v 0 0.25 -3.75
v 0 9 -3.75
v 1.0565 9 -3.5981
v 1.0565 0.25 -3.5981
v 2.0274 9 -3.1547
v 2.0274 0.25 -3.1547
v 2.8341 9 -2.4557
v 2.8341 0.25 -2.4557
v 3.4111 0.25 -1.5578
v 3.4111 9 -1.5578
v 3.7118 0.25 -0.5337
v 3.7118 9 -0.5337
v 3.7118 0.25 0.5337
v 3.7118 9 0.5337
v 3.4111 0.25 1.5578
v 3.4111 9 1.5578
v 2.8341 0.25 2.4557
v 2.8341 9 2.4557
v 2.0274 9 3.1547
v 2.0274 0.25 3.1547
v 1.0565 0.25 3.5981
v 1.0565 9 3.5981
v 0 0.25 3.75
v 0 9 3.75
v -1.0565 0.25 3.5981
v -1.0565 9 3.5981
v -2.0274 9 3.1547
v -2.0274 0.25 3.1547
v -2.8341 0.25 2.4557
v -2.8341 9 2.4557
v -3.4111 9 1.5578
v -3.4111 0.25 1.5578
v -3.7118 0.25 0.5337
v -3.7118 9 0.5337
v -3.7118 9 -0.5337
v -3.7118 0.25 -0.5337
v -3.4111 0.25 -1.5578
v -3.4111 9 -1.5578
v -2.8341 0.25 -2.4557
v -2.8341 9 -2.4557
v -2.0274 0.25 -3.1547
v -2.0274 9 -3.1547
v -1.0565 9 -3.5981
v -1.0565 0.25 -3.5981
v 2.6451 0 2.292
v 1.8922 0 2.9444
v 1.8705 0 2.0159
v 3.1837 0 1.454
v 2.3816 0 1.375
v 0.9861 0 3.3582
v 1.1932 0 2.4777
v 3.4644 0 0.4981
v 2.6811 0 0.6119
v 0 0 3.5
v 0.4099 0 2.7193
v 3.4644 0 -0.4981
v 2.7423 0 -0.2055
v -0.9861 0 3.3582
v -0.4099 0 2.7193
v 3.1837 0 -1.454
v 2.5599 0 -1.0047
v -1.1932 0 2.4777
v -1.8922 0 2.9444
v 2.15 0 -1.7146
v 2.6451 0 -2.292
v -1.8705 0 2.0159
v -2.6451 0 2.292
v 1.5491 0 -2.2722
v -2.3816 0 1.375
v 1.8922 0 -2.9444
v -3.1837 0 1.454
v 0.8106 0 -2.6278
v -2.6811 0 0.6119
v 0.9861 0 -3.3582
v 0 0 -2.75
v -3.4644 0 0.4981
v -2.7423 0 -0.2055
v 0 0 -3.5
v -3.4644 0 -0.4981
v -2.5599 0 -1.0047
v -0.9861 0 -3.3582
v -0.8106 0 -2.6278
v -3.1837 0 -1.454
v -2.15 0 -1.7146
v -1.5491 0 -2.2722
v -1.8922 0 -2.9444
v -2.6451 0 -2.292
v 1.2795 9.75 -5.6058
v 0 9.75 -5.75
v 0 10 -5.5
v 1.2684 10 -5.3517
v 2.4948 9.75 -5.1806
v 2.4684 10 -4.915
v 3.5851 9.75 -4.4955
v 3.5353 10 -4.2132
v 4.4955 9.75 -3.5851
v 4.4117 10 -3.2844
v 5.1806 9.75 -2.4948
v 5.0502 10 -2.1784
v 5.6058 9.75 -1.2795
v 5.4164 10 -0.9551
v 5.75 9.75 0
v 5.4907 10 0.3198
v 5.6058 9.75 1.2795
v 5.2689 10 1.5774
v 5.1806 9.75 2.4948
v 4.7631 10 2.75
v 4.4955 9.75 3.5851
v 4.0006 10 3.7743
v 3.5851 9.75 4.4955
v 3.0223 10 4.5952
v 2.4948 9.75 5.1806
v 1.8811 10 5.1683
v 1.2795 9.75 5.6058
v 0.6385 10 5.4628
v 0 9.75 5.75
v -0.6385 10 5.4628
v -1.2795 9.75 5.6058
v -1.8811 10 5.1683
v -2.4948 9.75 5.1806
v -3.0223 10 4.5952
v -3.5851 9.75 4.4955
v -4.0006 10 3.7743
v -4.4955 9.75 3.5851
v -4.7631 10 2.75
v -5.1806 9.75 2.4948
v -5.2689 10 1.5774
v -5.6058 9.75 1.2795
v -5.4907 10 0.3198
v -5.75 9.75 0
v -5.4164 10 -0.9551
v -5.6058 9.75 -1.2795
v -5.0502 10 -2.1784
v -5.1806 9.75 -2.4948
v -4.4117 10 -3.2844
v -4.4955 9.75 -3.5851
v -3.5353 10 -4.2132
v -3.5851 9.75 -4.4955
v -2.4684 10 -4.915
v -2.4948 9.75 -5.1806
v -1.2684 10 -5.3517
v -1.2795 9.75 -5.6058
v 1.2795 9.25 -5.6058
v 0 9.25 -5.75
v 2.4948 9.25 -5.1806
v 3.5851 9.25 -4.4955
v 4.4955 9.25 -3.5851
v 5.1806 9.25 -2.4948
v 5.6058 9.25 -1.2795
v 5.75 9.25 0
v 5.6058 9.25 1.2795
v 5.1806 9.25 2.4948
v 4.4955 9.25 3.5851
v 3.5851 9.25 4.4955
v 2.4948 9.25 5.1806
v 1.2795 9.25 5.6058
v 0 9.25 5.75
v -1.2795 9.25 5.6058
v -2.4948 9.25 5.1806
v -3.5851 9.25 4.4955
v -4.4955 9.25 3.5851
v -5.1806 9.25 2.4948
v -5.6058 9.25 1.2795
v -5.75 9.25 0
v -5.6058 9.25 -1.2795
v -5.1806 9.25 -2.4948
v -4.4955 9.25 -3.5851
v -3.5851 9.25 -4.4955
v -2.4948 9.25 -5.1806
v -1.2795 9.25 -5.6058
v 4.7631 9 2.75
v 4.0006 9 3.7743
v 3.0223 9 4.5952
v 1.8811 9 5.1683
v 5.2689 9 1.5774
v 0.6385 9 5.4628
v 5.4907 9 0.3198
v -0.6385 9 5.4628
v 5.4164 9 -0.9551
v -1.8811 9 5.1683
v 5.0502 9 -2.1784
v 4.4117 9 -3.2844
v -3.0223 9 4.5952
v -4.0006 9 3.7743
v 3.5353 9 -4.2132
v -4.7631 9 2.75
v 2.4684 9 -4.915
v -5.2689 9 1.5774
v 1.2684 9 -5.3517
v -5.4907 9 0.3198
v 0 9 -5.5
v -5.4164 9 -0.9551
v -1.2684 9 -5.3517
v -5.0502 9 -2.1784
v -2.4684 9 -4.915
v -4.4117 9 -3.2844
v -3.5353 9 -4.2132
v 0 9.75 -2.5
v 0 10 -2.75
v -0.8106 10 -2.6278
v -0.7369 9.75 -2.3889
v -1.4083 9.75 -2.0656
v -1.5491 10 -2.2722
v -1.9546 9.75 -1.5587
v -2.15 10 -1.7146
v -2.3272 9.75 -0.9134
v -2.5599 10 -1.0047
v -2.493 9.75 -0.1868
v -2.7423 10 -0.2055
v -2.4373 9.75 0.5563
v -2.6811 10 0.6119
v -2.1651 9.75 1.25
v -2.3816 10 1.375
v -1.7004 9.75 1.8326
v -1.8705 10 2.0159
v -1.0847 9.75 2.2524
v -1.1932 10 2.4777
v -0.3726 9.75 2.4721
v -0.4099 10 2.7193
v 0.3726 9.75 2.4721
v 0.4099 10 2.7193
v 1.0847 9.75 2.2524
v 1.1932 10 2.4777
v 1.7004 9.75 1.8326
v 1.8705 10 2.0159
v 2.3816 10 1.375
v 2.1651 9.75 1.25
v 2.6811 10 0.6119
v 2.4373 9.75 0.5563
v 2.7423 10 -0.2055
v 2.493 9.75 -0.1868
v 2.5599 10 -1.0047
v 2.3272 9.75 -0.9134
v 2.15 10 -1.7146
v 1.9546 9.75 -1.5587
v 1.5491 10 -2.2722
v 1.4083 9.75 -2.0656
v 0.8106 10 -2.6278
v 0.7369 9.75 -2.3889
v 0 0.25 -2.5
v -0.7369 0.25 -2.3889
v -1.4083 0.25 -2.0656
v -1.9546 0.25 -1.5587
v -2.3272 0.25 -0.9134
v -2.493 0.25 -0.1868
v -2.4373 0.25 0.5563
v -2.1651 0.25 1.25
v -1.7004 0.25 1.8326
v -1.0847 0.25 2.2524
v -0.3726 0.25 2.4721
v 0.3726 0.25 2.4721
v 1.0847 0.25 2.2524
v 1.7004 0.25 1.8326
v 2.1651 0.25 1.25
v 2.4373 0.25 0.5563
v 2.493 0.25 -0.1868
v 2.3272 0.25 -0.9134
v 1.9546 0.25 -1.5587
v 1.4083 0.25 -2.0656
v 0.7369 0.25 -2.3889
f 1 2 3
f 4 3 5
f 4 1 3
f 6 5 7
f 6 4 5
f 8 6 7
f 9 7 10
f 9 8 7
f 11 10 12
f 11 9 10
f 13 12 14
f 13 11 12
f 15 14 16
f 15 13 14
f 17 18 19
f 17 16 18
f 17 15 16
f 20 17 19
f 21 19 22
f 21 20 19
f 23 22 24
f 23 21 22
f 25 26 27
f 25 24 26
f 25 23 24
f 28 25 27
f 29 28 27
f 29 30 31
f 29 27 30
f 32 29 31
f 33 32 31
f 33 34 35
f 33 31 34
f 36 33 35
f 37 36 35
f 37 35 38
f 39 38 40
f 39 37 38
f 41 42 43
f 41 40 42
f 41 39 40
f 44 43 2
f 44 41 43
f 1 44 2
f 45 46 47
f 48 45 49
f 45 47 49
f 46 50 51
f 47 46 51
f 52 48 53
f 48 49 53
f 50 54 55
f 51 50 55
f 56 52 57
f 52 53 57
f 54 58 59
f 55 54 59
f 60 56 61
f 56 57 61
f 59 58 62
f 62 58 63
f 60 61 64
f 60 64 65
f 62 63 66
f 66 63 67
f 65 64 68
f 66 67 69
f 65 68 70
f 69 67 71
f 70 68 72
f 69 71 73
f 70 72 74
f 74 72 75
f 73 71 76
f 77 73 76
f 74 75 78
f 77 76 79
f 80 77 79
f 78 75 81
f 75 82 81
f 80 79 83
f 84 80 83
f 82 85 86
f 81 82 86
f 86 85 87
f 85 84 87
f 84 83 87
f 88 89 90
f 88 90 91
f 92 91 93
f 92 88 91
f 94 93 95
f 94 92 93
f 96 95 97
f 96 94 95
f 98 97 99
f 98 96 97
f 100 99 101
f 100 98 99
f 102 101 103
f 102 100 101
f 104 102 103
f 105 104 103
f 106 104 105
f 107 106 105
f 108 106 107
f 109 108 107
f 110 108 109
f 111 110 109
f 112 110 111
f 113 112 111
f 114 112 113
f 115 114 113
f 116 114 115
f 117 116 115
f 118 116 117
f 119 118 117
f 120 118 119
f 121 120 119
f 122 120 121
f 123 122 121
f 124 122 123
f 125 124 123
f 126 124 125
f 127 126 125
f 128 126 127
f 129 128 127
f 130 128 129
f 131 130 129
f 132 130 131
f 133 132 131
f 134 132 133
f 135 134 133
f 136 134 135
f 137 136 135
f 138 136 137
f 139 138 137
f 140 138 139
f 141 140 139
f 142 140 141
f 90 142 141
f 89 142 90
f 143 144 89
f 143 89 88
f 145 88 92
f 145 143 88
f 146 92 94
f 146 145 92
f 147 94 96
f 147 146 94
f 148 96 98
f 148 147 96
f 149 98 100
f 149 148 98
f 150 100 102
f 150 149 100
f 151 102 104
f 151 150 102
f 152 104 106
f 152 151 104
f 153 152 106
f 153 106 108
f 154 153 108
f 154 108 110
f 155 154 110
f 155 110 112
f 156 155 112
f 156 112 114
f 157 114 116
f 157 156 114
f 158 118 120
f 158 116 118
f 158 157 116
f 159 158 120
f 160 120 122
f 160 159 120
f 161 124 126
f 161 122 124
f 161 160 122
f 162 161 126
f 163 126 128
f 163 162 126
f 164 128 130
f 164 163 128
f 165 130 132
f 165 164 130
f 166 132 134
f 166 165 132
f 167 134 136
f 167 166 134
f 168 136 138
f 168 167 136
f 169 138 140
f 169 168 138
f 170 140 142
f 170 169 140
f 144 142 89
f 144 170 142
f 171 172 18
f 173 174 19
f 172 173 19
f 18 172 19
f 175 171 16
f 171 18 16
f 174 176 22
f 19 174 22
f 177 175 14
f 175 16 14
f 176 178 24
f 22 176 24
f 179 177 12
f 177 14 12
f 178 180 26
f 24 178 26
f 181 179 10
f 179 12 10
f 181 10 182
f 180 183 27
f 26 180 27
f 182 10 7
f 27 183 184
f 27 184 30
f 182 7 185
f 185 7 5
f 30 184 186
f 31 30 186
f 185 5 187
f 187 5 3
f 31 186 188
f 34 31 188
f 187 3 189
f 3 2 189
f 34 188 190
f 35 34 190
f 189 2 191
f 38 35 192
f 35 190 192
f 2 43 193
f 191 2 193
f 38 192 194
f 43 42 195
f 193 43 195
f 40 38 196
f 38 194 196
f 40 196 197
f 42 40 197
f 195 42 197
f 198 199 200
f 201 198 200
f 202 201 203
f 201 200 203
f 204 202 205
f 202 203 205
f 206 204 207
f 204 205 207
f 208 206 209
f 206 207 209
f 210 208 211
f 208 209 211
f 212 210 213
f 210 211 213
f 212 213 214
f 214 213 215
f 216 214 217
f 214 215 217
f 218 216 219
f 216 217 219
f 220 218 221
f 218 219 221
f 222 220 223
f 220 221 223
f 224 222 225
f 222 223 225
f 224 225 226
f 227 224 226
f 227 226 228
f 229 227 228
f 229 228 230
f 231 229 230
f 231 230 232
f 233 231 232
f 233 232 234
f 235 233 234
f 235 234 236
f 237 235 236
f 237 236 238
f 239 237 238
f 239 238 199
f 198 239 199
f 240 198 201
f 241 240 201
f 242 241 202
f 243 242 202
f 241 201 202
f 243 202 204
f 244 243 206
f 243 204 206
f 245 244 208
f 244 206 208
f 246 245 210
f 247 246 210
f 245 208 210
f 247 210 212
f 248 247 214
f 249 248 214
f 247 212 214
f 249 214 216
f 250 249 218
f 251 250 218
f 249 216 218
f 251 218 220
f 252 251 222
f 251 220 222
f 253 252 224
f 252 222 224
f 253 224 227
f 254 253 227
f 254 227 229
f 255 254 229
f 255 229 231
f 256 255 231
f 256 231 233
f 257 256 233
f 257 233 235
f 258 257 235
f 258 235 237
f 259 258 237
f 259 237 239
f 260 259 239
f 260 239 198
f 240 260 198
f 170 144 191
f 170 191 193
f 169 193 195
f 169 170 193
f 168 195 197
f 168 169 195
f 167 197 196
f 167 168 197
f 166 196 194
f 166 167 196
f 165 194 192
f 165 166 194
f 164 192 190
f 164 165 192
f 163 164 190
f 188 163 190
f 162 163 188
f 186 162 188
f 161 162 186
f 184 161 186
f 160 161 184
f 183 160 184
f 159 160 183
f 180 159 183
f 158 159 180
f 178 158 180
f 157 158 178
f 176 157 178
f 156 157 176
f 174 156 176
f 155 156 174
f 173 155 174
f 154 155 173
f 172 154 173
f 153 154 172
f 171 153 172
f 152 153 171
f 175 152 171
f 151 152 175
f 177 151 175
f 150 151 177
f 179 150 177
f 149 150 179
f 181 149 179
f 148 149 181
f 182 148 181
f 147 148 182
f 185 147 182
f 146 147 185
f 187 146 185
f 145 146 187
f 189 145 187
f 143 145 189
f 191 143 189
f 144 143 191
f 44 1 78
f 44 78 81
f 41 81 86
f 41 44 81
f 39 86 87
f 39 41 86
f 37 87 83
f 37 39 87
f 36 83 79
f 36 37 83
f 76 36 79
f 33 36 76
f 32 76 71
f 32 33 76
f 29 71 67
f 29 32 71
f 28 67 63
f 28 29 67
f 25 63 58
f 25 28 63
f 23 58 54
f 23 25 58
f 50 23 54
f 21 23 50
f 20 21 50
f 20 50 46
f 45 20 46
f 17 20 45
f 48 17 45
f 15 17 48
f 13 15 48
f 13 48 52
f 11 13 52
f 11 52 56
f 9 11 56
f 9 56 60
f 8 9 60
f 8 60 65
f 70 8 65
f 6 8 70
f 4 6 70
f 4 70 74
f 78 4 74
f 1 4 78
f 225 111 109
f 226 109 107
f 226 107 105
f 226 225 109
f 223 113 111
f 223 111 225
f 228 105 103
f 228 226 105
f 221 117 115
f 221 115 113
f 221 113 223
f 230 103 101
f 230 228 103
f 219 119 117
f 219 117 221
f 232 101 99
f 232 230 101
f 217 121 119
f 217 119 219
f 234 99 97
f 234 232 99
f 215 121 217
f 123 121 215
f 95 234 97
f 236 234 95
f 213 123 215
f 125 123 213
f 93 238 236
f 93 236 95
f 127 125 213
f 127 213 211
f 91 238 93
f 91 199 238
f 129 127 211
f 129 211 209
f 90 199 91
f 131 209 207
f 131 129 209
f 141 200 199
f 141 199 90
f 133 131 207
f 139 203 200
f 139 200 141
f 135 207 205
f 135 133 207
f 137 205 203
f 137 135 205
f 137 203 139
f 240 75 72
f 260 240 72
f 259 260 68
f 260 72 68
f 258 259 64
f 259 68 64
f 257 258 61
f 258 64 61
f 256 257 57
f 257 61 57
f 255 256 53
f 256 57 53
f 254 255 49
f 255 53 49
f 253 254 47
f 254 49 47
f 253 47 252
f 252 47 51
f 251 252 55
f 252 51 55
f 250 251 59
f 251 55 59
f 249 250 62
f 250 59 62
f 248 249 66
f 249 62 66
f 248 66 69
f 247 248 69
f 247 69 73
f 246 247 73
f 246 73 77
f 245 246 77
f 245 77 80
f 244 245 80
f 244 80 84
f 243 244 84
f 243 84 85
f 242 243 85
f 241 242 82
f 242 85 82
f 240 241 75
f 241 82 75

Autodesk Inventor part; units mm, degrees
ref_plane "YZ Plane" through (0, 0, 0) normal (1, 0, 0) x (0, 1, 0)
ref_plane "XZ Plane" through (0, 0, 0) normal (0, 1, 0) x (-1, 0, 0)
ref_plane "XY Plane" through (0, 0, 0) normal (0, 0, 1) x (1, 0, 0)
sketch "Эскиз1" plane through (0, 0, 0) normal (1, 0, 0) x (0, 1, 0)
  line L0 (10, -2.5) -> (10, -5.75)
  line L1 (10, -5.75) -> (9, -5.75)
  line L2 (9, -5.75) -> (9, -3.75)
  line L3 (9, -3.75) -> (0, -3.75)
  line L4 (0, -3.75) -> (0, -2.5)
  line L5 (0, -2.5) -> (10, -2.5)
  line L6 (-2, 0) -> (12, 0) projected
  point P0 (0, 0)
  dimension "d0" = 2.5
  dimension "d1" = 3.75
  dimension "d2" = 1
  dimension "d3" = 10
  dimension "d4" = 5.75
revolve "Вращение1" add sketch "Эскиз1" angle 360 about axis through (0, -10, 0) along (0, 1, 0)
chamfer "Фаска1" distance 0.25 angle 45 3 edges at (0, 10, 2.5) (0, 0, 2.5) (0, 0, 3.75)
chamfer "Фаска2" distance 0.25 angle 45 2 edges at (0, 9, 5.75) (0, 10, 5.75)
properties part number "sleeve" material "Алюминий 6061-AHC"
